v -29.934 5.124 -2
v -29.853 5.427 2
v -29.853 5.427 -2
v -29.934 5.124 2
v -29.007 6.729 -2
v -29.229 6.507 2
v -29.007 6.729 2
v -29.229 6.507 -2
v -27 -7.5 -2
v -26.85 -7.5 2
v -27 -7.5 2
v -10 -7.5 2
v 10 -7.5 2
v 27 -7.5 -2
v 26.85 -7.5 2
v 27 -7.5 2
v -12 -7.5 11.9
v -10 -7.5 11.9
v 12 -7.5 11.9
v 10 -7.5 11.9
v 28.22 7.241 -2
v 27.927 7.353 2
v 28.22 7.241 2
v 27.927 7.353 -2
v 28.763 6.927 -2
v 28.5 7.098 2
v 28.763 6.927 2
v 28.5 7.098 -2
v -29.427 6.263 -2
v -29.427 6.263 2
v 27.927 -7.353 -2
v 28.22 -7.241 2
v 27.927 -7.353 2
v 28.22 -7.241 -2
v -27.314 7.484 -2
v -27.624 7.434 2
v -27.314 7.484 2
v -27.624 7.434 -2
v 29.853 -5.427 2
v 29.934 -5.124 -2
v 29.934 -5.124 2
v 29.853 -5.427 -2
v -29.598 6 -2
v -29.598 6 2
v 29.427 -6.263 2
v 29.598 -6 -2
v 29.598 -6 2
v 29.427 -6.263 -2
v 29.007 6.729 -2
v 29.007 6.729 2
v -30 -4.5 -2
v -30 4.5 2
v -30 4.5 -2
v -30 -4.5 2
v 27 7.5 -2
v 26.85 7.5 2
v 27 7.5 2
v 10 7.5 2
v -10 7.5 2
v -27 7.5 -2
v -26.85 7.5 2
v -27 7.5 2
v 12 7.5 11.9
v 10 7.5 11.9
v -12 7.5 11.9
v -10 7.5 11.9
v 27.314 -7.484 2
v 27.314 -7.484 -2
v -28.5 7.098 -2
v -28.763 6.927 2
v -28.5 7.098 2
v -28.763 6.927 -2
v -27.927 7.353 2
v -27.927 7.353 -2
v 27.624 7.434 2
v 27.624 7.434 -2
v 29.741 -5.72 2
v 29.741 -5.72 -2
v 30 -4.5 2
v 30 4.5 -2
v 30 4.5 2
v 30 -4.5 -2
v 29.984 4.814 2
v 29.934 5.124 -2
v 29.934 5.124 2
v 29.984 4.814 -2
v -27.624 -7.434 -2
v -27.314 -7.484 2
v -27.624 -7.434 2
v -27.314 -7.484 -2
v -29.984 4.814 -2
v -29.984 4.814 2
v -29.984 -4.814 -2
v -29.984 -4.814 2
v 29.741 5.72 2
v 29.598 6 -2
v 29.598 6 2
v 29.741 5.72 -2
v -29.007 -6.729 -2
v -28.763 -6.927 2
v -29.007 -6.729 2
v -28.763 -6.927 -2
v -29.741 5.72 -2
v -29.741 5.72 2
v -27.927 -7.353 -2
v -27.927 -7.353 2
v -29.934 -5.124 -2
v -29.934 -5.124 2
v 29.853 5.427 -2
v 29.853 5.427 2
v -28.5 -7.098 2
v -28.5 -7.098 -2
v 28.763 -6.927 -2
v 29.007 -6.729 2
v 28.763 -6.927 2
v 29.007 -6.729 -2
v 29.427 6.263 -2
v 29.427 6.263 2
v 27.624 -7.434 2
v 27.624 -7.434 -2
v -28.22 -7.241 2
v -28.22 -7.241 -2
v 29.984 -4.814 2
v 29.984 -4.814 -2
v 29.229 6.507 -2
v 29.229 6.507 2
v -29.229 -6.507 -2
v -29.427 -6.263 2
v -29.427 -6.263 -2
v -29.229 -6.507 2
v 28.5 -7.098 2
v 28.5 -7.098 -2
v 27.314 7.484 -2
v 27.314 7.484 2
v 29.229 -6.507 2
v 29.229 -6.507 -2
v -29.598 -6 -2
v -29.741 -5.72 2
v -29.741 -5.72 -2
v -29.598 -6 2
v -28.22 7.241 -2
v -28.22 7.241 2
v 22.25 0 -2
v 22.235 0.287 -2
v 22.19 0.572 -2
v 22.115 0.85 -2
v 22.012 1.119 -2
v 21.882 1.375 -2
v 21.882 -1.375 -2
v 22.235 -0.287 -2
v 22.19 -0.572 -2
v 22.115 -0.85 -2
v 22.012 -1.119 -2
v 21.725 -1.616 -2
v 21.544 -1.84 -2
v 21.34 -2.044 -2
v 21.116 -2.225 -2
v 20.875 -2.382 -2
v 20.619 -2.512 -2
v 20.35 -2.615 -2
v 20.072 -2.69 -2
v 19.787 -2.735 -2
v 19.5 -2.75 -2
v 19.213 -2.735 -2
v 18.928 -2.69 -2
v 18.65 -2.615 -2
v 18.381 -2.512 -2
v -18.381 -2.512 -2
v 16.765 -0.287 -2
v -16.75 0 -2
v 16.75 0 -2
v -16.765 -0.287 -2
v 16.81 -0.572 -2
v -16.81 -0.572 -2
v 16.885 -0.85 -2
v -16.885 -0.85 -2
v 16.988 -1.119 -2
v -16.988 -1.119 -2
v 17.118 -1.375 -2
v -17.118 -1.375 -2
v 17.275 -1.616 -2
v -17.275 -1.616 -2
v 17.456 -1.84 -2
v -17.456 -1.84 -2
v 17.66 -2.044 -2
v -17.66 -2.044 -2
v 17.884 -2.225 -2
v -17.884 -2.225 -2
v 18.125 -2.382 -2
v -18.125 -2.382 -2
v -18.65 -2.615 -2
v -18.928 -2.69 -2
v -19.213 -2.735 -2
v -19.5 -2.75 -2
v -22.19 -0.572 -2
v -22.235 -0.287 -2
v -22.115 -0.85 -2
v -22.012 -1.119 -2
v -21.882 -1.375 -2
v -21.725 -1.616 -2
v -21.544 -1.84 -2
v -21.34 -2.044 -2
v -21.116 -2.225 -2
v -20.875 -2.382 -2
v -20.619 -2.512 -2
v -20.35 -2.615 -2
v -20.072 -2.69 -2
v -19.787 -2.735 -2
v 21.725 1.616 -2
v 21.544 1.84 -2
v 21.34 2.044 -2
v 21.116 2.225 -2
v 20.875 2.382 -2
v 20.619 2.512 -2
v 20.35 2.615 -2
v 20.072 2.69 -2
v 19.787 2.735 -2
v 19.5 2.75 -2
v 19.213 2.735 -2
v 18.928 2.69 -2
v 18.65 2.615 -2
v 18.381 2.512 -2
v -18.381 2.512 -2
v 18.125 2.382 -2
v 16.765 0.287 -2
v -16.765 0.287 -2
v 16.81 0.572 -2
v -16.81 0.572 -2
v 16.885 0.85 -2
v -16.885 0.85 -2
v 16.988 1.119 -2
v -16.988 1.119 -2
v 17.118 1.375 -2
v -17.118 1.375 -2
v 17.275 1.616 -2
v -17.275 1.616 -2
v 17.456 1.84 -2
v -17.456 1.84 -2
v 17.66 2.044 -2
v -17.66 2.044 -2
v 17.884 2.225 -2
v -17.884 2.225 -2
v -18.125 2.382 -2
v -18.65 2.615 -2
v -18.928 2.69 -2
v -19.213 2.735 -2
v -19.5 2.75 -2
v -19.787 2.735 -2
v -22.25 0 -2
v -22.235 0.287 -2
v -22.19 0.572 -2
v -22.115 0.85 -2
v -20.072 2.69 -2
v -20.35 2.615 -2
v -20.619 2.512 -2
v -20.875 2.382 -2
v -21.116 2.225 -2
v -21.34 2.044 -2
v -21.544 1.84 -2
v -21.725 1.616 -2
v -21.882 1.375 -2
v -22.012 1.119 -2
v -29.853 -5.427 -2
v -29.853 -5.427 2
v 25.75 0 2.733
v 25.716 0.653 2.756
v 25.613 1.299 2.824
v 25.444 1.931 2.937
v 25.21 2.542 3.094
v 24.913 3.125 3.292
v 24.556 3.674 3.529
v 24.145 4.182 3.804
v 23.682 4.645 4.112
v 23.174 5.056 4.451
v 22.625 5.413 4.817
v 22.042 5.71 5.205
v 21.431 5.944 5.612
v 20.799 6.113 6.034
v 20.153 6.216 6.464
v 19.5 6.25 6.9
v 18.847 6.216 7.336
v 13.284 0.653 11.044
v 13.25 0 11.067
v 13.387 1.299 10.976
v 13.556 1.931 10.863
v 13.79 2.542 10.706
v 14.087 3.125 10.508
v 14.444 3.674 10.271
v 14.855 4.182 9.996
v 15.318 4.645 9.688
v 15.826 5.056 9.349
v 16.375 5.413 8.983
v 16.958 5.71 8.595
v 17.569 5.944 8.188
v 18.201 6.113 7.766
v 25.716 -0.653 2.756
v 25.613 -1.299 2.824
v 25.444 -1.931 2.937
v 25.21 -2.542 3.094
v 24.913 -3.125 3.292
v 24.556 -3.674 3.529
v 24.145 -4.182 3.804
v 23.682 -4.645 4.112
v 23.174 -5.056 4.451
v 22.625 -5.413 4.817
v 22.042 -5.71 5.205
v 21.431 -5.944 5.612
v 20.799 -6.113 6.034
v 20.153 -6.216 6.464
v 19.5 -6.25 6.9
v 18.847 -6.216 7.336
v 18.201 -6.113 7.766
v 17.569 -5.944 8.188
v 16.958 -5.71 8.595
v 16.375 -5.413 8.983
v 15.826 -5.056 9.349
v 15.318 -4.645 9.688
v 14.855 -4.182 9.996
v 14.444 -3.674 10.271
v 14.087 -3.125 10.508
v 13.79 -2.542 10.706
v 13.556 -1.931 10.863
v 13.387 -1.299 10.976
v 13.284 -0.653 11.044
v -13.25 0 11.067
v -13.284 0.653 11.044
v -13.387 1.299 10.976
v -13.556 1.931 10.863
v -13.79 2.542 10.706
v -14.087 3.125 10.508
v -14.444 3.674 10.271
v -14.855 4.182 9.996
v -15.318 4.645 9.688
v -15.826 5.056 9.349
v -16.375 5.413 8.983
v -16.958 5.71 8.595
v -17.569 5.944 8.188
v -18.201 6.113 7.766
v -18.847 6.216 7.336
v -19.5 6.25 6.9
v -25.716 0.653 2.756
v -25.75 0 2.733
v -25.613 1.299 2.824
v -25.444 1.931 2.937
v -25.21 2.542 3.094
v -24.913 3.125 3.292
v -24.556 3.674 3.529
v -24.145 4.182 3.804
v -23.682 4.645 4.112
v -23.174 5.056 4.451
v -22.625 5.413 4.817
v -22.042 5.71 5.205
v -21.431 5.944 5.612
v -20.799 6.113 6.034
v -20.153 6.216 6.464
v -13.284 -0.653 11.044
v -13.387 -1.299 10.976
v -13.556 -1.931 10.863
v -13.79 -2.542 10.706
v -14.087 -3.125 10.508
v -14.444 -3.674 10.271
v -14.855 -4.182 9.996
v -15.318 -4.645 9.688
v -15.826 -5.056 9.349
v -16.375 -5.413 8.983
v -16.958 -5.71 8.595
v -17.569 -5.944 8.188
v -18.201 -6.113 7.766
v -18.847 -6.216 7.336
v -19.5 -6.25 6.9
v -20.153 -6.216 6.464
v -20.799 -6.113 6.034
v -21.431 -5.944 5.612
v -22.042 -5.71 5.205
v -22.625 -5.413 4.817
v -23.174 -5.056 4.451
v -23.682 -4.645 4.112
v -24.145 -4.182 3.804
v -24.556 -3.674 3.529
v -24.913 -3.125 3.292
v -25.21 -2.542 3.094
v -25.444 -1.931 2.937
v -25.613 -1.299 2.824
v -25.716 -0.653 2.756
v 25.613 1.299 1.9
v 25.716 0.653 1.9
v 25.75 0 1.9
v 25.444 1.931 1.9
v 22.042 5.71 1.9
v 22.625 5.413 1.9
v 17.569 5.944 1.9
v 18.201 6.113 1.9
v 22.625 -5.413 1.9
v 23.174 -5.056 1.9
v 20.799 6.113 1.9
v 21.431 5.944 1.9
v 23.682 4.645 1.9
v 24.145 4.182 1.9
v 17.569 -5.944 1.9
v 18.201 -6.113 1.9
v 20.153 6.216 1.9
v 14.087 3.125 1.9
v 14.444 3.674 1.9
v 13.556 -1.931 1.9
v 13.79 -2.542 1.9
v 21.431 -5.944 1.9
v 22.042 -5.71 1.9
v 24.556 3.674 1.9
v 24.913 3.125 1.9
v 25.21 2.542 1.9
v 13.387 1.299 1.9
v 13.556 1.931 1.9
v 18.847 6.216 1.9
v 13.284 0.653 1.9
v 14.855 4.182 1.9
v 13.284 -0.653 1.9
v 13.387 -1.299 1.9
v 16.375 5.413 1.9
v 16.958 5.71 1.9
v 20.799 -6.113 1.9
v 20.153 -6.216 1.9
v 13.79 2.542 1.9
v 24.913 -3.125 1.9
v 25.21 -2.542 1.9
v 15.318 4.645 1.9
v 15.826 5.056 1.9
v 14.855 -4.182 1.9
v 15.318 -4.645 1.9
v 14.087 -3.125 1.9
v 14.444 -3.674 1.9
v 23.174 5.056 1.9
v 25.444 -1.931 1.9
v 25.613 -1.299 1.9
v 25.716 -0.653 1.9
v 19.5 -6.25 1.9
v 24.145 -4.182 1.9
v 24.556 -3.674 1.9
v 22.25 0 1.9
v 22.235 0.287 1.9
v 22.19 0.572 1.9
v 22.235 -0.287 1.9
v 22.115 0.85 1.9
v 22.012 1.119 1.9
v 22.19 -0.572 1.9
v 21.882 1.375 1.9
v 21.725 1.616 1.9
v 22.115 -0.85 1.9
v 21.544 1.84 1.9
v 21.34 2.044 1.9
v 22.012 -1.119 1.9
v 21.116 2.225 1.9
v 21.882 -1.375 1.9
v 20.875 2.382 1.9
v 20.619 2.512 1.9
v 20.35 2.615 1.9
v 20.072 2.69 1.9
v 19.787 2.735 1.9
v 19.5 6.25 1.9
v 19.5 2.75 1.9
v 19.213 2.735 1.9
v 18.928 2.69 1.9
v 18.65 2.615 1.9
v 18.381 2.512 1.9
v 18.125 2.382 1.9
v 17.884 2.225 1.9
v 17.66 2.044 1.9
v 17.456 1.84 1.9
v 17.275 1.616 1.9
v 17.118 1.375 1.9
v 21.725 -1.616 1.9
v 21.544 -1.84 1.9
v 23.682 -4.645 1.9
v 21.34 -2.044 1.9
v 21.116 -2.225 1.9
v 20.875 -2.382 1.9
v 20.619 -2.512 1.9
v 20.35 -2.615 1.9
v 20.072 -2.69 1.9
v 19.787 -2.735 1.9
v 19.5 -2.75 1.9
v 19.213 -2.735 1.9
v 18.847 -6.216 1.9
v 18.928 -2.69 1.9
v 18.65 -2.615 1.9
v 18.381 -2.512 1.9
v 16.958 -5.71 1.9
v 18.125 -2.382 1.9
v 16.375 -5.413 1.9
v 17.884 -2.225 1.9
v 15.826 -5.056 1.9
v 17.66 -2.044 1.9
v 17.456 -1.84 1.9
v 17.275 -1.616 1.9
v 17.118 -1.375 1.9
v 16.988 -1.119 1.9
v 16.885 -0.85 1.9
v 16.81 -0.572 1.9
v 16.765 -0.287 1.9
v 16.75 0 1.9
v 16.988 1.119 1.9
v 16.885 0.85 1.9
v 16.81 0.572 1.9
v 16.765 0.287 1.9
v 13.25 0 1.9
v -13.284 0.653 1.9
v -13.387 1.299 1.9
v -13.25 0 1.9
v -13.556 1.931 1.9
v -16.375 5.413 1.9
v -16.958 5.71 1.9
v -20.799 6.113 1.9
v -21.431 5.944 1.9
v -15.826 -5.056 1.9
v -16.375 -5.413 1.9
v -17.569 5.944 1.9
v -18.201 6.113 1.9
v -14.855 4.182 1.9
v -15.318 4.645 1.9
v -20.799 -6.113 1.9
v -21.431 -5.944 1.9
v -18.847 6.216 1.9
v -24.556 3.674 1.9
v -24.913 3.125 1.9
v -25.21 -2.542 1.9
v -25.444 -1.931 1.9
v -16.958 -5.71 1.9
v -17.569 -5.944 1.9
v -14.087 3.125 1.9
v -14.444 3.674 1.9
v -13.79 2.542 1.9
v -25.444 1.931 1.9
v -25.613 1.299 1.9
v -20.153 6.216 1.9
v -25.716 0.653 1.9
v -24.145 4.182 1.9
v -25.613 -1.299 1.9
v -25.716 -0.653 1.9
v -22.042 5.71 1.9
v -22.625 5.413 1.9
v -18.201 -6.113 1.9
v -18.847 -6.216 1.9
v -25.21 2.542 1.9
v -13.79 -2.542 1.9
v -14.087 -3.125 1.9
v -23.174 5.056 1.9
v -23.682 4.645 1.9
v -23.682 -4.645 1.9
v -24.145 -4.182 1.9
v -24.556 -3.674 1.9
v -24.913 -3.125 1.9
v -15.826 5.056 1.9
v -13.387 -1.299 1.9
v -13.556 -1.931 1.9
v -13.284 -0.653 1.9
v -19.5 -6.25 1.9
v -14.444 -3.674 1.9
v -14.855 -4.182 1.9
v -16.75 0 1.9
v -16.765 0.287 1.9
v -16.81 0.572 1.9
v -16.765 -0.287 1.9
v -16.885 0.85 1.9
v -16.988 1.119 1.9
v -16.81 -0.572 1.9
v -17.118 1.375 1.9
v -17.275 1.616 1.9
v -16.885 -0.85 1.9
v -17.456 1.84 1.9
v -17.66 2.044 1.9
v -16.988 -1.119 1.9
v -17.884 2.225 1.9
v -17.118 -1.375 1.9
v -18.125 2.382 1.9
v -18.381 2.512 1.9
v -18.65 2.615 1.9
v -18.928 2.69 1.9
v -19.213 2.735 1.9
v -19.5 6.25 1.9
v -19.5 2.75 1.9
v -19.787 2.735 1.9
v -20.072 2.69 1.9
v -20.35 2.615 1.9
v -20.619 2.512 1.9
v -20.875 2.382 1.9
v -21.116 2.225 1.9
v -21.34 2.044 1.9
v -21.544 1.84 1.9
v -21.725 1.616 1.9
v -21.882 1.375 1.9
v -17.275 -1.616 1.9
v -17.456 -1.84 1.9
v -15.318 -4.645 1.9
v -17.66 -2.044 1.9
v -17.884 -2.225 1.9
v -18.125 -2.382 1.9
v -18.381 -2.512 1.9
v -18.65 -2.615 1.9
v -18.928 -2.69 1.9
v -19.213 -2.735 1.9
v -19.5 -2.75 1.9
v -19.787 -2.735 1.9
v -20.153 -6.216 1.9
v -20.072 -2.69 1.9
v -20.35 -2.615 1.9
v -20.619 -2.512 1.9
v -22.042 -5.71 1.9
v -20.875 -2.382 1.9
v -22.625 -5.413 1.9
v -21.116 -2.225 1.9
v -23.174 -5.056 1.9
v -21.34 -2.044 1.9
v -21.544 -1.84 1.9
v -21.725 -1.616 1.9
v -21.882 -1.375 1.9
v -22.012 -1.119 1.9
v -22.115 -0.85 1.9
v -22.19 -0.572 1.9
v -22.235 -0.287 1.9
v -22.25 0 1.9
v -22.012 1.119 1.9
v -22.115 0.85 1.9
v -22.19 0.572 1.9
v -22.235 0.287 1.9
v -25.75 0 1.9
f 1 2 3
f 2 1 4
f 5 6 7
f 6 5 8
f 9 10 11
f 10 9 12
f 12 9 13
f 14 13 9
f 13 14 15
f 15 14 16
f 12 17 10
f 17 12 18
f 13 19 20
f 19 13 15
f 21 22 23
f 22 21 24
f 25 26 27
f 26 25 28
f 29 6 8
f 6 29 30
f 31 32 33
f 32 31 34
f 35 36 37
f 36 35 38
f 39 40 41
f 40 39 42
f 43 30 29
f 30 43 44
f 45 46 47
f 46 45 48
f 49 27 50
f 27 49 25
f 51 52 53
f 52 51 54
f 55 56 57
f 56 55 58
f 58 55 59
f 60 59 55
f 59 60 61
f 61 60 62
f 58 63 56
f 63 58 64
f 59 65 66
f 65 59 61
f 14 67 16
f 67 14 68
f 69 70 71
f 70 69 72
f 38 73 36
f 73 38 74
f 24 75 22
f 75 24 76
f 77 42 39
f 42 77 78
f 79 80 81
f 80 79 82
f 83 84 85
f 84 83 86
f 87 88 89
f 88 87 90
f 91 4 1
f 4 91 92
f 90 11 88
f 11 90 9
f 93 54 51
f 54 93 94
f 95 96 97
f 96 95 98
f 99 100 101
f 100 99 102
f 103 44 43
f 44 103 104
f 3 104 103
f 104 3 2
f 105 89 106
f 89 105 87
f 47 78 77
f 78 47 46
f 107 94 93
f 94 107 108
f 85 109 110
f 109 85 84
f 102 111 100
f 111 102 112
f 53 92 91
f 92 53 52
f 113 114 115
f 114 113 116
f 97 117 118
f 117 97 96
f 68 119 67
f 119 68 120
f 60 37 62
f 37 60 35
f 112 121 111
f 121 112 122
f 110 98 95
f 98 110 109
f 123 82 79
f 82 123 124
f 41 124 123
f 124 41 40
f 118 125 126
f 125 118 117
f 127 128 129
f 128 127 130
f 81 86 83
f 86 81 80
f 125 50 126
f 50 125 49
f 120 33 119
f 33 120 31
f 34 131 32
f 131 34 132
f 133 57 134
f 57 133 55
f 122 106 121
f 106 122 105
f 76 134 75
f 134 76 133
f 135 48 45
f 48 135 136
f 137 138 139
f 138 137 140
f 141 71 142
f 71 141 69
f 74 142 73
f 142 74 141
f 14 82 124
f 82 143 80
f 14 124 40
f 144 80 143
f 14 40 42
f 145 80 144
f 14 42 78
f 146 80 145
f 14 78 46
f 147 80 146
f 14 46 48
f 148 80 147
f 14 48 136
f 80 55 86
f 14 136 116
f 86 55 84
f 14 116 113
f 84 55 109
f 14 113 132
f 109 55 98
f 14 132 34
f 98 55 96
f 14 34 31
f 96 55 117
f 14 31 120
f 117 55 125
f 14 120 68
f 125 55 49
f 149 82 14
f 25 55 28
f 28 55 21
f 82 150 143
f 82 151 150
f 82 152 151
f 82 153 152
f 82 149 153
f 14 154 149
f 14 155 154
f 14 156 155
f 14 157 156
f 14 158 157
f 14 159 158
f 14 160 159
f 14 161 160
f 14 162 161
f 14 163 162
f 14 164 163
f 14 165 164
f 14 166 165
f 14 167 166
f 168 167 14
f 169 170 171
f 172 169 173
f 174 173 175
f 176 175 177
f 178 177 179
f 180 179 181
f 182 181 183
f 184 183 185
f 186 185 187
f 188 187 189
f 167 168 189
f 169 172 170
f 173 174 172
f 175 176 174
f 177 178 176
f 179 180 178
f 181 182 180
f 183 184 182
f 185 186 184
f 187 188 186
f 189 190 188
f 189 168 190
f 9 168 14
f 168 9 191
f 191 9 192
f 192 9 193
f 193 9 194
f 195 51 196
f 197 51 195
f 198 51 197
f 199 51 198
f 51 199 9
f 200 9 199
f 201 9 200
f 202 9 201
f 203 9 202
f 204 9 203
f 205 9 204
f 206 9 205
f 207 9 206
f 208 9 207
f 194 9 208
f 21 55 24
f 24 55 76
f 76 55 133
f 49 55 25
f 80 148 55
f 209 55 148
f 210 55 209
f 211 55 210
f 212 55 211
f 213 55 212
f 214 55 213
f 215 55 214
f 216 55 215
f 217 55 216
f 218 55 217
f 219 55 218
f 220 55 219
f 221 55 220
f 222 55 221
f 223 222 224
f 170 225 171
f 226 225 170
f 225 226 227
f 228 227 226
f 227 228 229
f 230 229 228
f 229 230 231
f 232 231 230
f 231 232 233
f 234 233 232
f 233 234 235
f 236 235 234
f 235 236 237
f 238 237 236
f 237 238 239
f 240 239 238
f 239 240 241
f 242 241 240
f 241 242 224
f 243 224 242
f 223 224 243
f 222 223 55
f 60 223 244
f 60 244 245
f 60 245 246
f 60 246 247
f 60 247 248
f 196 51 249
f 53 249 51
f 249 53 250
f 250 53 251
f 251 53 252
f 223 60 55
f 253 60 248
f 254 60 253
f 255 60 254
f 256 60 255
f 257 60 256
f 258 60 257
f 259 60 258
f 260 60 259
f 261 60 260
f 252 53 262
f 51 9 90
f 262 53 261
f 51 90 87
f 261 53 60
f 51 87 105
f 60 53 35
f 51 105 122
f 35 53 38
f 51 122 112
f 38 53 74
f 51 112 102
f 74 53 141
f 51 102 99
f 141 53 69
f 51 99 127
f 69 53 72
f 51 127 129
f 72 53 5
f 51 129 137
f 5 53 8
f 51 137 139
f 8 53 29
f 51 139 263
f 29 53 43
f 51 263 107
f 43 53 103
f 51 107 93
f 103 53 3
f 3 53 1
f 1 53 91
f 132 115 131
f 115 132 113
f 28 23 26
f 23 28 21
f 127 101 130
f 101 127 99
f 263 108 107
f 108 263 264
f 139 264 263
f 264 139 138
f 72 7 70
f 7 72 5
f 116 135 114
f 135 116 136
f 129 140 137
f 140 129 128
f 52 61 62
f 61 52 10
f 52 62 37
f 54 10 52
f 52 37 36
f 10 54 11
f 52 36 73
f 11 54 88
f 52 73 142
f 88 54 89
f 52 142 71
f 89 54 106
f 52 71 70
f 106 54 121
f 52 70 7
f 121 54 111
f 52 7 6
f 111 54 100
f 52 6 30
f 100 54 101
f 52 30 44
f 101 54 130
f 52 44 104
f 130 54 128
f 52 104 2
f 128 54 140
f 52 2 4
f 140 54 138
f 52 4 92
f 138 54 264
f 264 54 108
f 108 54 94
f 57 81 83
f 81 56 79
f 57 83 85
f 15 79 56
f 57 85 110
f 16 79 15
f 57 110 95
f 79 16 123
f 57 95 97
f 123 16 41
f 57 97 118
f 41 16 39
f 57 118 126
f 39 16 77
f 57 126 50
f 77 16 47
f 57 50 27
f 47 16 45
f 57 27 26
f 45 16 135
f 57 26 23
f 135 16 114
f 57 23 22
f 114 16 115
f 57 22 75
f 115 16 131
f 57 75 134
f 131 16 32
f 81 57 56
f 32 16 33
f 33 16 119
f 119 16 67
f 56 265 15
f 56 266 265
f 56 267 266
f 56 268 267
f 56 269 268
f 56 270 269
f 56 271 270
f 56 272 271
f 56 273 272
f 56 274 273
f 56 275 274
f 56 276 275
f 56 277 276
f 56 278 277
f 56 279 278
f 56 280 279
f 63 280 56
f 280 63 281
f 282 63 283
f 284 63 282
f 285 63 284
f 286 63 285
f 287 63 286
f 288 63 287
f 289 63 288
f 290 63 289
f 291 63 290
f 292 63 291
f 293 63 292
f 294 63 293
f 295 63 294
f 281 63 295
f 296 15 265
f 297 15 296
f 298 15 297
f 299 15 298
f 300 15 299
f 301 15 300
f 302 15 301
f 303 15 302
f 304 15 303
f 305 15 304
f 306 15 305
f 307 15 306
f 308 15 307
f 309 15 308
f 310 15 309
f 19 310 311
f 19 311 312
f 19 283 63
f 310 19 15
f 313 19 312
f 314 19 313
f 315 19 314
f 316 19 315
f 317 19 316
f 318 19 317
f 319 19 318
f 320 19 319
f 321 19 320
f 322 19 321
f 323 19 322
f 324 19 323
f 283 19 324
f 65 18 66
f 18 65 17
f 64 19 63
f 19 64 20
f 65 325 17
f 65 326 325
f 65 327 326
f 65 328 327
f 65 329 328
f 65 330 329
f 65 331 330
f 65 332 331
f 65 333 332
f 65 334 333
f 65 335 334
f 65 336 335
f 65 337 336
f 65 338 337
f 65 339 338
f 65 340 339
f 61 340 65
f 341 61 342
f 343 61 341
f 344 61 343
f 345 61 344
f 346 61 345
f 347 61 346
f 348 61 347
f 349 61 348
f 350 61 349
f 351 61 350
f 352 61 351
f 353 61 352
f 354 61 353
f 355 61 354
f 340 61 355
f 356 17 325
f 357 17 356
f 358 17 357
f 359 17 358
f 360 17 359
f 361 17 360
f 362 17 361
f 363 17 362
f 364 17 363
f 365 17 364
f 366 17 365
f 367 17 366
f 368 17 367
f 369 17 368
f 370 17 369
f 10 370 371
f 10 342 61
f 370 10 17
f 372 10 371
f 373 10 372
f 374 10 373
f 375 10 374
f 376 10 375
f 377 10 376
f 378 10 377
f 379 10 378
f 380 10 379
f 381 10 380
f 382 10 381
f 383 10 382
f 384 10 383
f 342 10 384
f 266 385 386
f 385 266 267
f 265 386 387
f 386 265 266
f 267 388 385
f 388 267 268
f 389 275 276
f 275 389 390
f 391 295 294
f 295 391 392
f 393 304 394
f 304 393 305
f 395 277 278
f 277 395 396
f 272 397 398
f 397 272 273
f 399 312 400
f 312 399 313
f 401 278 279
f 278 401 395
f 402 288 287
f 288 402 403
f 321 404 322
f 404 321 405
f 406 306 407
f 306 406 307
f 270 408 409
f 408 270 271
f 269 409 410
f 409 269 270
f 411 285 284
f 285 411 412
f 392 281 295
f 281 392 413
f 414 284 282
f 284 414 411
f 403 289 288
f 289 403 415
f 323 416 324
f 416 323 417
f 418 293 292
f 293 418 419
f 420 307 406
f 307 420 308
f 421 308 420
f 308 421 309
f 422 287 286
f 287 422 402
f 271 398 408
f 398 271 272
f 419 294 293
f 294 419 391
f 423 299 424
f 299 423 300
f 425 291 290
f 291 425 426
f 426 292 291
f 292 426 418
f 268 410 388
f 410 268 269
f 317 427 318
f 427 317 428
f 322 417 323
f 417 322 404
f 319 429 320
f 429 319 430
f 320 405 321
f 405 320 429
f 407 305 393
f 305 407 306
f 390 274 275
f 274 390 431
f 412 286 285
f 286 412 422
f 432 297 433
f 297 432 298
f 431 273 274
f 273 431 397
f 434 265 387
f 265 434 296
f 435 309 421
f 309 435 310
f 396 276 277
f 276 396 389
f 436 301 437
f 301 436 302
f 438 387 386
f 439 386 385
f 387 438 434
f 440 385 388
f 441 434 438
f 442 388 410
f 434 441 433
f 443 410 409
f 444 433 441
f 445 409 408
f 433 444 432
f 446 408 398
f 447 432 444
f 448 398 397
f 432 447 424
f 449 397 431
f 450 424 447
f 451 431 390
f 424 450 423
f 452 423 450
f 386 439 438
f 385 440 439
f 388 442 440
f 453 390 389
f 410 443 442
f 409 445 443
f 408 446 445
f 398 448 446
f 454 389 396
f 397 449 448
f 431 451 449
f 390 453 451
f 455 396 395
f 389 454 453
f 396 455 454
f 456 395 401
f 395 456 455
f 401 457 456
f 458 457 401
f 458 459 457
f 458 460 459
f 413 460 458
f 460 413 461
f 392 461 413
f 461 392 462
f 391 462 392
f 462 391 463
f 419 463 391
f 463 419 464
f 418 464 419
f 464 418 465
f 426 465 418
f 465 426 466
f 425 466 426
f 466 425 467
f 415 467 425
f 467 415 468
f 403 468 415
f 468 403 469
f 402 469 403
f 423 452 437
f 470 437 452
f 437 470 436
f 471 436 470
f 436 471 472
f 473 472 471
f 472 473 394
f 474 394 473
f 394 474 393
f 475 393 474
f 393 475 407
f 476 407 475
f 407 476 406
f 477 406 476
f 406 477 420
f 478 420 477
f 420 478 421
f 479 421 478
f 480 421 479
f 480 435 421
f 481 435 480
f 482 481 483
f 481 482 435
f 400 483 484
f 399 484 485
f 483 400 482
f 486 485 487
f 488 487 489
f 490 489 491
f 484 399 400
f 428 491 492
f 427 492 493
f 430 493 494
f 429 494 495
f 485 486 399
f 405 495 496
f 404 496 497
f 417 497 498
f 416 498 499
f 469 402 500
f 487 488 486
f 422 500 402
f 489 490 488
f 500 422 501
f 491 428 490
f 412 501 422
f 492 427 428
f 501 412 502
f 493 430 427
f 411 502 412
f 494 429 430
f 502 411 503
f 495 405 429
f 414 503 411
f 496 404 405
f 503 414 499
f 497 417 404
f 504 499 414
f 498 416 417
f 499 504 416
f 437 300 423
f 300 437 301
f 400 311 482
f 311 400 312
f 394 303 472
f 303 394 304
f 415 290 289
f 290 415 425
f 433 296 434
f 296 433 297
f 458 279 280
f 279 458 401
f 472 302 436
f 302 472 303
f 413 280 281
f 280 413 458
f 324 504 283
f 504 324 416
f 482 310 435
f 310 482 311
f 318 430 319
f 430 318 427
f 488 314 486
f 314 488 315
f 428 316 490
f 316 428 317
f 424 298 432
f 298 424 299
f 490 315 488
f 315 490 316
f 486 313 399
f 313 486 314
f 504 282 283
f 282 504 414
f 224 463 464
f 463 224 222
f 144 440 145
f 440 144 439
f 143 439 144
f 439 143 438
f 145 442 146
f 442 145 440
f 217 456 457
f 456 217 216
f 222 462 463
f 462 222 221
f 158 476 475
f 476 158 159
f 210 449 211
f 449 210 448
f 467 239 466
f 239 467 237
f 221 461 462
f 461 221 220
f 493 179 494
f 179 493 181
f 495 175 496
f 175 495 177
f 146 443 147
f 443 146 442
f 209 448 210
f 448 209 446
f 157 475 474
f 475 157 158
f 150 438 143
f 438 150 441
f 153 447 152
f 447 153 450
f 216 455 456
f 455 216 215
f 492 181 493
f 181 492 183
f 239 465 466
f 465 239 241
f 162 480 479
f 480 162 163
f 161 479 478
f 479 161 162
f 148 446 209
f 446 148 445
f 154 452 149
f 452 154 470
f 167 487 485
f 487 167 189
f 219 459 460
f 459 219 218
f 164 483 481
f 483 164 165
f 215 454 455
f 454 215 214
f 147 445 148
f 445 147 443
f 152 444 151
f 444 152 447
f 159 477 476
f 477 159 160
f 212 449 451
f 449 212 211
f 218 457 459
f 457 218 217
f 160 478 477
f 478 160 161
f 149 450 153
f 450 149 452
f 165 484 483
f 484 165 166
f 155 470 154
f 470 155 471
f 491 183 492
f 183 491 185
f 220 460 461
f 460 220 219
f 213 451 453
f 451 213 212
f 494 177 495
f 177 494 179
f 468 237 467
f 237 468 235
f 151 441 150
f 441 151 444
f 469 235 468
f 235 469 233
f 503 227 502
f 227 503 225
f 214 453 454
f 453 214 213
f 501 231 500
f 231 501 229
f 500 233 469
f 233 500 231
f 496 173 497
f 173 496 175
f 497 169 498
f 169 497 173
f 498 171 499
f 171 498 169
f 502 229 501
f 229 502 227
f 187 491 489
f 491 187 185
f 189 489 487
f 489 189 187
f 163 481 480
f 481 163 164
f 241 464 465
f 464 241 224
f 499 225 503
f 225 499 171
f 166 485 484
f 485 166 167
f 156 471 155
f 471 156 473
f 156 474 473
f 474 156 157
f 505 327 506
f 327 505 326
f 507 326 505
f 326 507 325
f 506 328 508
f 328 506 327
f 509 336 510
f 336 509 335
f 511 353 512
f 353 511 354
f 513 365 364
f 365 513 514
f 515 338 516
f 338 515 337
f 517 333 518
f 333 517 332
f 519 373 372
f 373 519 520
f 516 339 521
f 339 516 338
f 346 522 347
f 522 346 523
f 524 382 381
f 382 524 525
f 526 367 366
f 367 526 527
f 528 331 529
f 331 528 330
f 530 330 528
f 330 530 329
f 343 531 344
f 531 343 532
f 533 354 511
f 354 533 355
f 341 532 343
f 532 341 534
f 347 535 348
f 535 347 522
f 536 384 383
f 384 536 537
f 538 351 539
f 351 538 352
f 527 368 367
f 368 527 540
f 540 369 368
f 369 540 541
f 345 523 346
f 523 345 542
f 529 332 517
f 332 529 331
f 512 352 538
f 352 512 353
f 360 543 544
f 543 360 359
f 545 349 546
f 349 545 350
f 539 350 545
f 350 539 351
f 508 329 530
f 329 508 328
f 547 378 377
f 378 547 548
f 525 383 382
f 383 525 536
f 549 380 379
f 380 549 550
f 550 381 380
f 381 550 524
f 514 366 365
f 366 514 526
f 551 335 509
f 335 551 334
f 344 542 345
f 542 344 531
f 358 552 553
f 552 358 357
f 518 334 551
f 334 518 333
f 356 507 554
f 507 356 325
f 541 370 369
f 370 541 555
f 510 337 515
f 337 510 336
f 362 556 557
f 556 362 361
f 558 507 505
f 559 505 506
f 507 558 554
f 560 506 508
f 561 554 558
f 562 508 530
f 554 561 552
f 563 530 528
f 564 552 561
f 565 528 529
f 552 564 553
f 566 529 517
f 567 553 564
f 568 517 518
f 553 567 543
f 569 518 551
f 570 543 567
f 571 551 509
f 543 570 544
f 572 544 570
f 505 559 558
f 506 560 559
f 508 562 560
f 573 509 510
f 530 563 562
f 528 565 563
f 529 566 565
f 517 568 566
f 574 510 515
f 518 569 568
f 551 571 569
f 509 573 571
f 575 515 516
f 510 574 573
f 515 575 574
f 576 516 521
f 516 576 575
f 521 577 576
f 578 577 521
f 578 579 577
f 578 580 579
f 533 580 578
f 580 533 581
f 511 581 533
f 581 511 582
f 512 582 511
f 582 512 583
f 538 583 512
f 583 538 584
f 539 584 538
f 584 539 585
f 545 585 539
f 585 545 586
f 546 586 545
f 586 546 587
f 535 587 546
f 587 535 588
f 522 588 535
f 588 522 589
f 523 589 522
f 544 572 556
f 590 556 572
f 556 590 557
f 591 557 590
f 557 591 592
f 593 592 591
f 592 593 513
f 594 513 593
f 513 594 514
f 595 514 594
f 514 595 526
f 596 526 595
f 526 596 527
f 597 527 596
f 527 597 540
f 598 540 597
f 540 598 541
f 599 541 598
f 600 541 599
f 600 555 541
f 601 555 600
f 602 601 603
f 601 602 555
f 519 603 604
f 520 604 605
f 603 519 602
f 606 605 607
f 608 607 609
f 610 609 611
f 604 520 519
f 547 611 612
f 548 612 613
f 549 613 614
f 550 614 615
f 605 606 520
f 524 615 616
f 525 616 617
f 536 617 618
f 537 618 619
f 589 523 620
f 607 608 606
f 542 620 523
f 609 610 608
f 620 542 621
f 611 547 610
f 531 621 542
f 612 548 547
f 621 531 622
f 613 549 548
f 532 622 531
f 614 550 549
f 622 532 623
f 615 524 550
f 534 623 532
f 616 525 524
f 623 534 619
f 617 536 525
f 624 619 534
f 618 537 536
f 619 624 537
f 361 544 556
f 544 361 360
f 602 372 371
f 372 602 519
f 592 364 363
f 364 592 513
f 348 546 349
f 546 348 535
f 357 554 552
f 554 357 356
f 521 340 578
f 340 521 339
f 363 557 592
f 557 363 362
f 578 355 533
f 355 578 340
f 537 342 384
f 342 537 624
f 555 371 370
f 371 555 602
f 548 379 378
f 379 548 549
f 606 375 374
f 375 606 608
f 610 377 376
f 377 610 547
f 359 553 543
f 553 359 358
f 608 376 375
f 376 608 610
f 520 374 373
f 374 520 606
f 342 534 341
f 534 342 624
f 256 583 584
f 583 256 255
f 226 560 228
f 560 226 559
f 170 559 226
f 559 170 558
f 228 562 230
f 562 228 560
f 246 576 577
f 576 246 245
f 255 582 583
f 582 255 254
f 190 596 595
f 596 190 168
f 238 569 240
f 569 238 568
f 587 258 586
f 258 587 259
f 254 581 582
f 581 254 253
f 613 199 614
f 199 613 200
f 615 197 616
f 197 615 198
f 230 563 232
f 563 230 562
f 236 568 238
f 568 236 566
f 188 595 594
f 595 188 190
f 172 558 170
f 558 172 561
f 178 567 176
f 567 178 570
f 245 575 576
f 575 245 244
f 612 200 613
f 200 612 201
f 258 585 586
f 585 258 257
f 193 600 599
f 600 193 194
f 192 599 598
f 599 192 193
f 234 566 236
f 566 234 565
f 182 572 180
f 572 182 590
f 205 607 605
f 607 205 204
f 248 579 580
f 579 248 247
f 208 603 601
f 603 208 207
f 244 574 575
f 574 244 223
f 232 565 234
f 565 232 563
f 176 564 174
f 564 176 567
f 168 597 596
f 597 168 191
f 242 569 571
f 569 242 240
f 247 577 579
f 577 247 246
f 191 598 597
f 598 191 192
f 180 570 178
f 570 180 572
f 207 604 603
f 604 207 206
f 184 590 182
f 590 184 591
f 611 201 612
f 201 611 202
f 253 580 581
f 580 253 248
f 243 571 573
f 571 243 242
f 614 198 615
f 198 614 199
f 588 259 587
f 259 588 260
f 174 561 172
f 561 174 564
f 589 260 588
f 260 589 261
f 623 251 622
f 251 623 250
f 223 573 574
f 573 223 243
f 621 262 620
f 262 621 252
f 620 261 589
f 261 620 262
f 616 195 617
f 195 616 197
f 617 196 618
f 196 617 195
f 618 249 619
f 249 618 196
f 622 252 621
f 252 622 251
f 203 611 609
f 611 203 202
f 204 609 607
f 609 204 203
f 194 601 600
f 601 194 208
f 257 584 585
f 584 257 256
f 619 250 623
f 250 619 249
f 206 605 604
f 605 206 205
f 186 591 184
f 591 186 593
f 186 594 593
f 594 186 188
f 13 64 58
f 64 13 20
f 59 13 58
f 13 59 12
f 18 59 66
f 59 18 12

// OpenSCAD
$fn = 60;


woodThickness = 20;
screwHeadDiamiter = 12.5;
screwShaftDiamiter = 5.5;

baseWidth = 15;
baseLength = 60;
basethickness = 4;

wedgeLength = 15;
spacing = (baseLength/2) - (wedgeLength/2) - 3 ;

difference(){
	union(){
		plate4Point(baseLength,baseWidth,basethickness,6);
		
		hull(){
			for(a = [[spacing,0],[-spacing,180]]){
				translate([a[0],0,6.9])
					rotate([0,0,a[1]])
					wedge(wedgeLength, 10, baseWidth);
			}
		}
	}
		for(a = [[spacing,0],[-spacing,180]]){
				translate([a[0],0,6.9])
			//		rotate([0,0,a[1]])
					screwCutOut(screwHeadDiamiter, screwShaftDiamiter);

		}
		translate([0,0,20+(basethickness/2)])
			cube([woodThickness,40,40],center=true);
}
////////////////////////////////////////////////////////////////////////////////////////////////////
module wedge(o_len, a_len, width){
	rotate([0,270,270])
		translate([0,0,-1*(width/2)])
		linear_extrude(height=width){
			translate([-1*(a_len/2),-1*(o_len/2),0])
			polygon(points=[[0,0],[a_len,0],[0,o_len]], paths=[[0,1,2]]);
		}
}
////////////////////////////////////////////////////////////////////////////////////////////////////
module screwCutOut(headDiamitor, shaftDiamitor){

	cylinder(h=10, d=headDiamitor, center=true);
	translate([0,0,-9])
		cylinder(h=10, d=shaftDiamitor, center=true);

}
////////////////////////////////////////////////////////////////////////////////////////////////////
module plate4Point(x,y,z,d){
	hull(){
		color("green") translate([(x/2)-(d/2) ,(y/2) -(d/2),0]) cylinder(h=z, d=d, center=true);
		color("blue")  translate([(x/2)-(d/2) ,-(y/2)+(d/2),0]) cylinder(h=z, d=d, center=true);
		color("red")   translate([-(x/2)+(d/2),(y/2) -(d/2),0]) cylinder(h=z, d=d, center=true);
		color("grey")  translate([-(x/2)+(d/2),-(y/2)+(d/2),0]) cylinder(h=z, d=d, center=true);
	}
}
